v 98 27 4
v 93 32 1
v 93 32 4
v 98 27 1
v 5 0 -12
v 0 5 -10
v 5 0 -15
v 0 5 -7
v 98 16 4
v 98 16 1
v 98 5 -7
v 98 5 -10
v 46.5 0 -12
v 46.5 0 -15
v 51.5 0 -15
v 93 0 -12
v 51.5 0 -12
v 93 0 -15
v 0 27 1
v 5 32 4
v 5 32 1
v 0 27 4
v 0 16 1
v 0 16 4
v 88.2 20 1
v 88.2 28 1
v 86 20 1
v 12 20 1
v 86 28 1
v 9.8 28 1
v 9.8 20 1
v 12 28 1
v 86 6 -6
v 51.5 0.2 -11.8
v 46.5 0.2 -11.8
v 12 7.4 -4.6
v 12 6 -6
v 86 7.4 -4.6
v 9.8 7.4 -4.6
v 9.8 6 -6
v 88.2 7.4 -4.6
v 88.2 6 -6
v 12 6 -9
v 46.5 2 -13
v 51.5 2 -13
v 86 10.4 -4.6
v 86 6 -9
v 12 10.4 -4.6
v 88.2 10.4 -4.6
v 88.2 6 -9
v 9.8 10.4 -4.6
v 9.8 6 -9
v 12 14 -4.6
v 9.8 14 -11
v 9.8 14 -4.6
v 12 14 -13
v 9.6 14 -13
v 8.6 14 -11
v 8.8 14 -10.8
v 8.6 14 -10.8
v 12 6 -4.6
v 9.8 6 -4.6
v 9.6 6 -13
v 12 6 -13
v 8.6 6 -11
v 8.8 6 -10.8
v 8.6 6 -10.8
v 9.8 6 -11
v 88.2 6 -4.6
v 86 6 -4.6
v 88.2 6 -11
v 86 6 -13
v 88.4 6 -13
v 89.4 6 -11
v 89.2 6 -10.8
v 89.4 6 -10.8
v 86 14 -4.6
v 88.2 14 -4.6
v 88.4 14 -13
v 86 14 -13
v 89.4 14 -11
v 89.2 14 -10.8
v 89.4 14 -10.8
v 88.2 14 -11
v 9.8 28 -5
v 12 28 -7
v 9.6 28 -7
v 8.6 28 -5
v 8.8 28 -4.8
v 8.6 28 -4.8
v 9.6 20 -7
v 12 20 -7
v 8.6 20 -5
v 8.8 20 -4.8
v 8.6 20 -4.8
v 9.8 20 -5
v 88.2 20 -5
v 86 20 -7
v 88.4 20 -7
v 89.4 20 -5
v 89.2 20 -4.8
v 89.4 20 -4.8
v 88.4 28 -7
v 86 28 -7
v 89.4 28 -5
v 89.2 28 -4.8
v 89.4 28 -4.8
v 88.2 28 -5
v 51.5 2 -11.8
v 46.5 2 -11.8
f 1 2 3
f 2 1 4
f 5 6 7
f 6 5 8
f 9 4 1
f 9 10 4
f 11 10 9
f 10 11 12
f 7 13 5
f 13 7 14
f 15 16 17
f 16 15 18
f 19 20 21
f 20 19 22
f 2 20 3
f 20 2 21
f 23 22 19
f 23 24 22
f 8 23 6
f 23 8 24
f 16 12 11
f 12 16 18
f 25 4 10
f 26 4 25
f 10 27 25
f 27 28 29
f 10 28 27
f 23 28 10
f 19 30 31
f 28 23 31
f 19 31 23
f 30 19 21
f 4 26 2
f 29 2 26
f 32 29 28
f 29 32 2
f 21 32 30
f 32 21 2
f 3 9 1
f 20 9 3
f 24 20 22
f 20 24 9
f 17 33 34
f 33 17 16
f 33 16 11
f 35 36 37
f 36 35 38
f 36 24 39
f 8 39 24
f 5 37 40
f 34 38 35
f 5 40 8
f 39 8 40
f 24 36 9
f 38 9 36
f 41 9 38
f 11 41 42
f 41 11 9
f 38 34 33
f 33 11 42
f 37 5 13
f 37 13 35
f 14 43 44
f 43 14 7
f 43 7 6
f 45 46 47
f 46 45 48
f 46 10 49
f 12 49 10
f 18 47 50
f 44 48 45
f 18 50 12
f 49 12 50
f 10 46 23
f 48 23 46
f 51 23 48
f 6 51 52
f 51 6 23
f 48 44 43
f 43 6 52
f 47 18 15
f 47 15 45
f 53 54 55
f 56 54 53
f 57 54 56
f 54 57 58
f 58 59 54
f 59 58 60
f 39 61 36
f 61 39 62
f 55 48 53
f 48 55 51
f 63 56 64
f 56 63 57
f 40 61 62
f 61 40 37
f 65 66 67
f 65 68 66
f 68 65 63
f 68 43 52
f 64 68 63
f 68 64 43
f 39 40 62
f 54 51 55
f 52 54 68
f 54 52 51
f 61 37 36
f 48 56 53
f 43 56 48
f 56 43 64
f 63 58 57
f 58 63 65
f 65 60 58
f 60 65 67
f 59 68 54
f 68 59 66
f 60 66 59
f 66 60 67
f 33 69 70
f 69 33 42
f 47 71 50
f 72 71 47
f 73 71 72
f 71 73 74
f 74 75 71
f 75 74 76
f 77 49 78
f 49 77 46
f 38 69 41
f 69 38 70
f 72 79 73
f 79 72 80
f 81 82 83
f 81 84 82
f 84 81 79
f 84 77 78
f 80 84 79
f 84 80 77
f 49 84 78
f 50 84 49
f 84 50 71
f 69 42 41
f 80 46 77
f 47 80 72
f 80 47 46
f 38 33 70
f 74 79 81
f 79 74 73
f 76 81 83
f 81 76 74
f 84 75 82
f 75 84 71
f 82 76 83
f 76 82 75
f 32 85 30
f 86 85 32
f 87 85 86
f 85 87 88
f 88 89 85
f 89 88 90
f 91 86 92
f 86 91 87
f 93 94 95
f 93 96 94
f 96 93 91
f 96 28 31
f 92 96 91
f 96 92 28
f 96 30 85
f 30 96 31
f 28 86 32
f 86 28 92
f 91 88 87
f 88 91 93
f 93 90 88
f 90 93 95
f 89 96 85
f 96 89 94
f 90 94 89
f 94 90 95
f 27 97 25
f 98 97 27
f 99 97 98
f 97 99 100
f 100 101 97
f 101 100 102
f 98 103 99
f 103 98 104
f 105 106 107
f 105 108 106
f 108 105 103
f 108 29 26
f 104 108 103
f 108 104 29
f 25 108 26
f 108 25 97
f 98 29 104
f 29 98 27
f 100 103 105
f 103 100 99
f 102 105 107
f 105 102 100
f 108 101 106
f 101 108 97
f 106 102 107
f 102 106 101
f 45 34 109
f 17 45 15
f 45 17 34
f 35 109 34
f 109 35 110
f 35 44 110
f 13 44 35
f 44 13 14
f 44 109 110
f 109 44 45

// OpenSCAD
// file: lib/interface-contracts.scad
// Mechanical interface contracts shared by every part that mates to the case.
// Change interfaces here, never independently in a cover and its receiver.

case_body = [330, 155, 195];
case_wall = 4;
case_chamfer = 16;

front_contract_size = [155, 195, 12];
front_contract_screws = [[18, 18], [137, 18], [18, 177], [137, 177]];
front_button_opening = [45.2, 32.3];
front_button_origin = [15, 148];
front_usb_opening = [28.6, 71];
front_usb_origin = [111, 87];
front_usb_face = [27.93, 70.35, 3];

intake_contract_half = [130, 131, 4];
intake_contract_gap = 10;
intake_contract_origin_x = [30, 170];
intake_contract_z = 32;
intake_contract_magnet_local = [[24, 4], [106, 4],
                                [24, 127], [106, 127]];

esp_contract_opening = [74, 28];
esp_contract_cover = [98, 32, 3];
// Four side snaps: X axes coincide with the vertical opening edges, while the
// two Y levels stay clear of both the bottom chamfer and intake cover above.
esp_contract_snap_x = [12, 86];
esp_contract_snap_y = [10, 24];

rear_contract_screw_y = [30, 125];
rear_contract_screw_z = [5, 190];
rear_contract_horizontal_depth = 6;
rear_contract_vertical_depth = 44;

psu_contract_face = [110, 46.34];
psu_contract_rear_inner_x = 318;
// file: lib/snap-interface.scad
// Hidden panel snap interface v0.1.
// Print and test the coupon before committing full panels to a printer.

snap_arm_width = 8;
snap_arm_thickness = 2.2;
snap_arm_drop = 8;
snap_barb_depth = 1.0;
snap_barb_height = 2.0;
snap_slot_clearance = 0.30;

module snap_hook() {
    // Panel underside is Z=0; hook extends downward.
    union() {
        translate([-snap_arm_width / 2, 0, -snap_arm_drop])
            cube([snap_arm_width, snap_arm_thickness, snap_arm_drop + 0.4]);
        hull() {
            translate([-snap_arm_width / 2, snap_arm_thickness, -snap_arm_drop])
                cube([snap_arm_width, 0.2, snap_barb_height]);
            translate([-snap_arm_width / 2, snap_arm_thickness + snap_barb_depth, -snap_arm_drop + snap_barb_height])
                cube([snap_arm_width, 0.2, 0.2]);
        }
    }
}

module snap_receiver_slot(depth = 8, clearance = snap_slot_clearance) {
    translate([
        -snap_arm_width / 2 - clearance,
        -0.1,
        -snap_arm_drop - clearance
    ])
        cube([
            snap_arm_width + 2 * clearance,
            depth + 0.2,
            snap_arm_drop + 2 * clearance
        ]);
}
// main file
// Separate snap-fit cover for the side-load ESP32 relay cassette.
include <lib/snap-interface.scad>
include <lib/interface-contracts.scad>

$fn = 40;

// Local axes: X along the case, Y upward, Z toward the case exterior.
// The lower 16 mm follows the enclosure chamfer; above it the outer face is
// flush with the straight Y=155 side wall.
cover = esp_contract_cover;
cover_chamfer = 5;
snap_x = esp_contract_snap_x;
snap_y = esp_contract_snap_y;
flat_inner_z = 1;

// Inner surface follows the enclosure's lower 16 mm chamfer.  A snap anchored
// to the constant Z=1 plane at the lower edge would sit outside the case.
function inner_z_at(y, case_chamfer = 16) =
    y < case_chamfer ? flat_inner_z - case_chamfer + y : flat_inner_z;

module cover_outline_2d(cover_size = cover) {
    polygon([[cover_chamfer, 0], [cover_size[0] - cover_chamfer, 0],
             [cover_size[0], cover_chamfer],
             [cover_size[0], cover_size[1] - cover_chamfer],
             [cover_size[0] - cover_chamfer, cover_size[1]],
             [cover_chamfer, cover_size[1]], [0, cover_size[1] - cover_chamfer],
             [0, cover_chamfer]]);
}

module flush_chamfered_solid(cover_size = cover, case_chamfer = 16,
                             wall_thickness = 3) {
    intersection() {
        // Face outline and 5 mm corner cuts.
        translate([0, 0, -20])
            linear_extrude(height = 30) cover_outline_2d(cover_size);

        // Y/Z section: 3 mm material following the lower case chamfer, then
        // a constant Z=1..4 slab on the straight side wall.
        multmatrix([
            [0, 0, 1, 0],
            [1, 0, 0, 0],
            [0, 1, 0, 0],
            [0, 0, 0, 1]
        ])
            linear_extrude(height = cover_size[0])
                polygon([[0, 1 - case_chamfer], [case_chamfer, 1],
                         [cover_size[1], 1],
                         [cover_size[1], 1 + wall_thickness],
                         [case_chamfer, 1 + wall_thickness],
                         [0, 1 + wall_thickness - case_chamfer]]);
    }
}

module esp32_service_cover(cover_size = cover, case_chamfer = 16) {
    difference() {
        union() {
            flush_chamfered_solid(cover_size, case_chamfer, cover_size[2]);

            // Two hooks per side engage the vertical opening edges.  Side
            // retention avoids the intake cover immediately above this part.
            for (y = snap_y) {
                translate([snap_x[0], y, inner_z_at(y, case_chamfer)])
                    rotate([0, 0, 90]) snap_hook();
                translate([snap_x[1], y, inner_z_at(y, case_chamfer)])
                    rotate([0, 0, -90]) snap_hook();
            }
        }

        // Small 5 x 2 mm bottom chamfer/notch for a fingernail or plastic pick.
        translate([cover_size[0] / 2 - 2.5, -0.1,
                   0.9 - case_chamfer])
            cube([5, 2.1, 3.3]);
    }
}

esp32_service_cover();

echo("ESP32 service cover mm", cover);
echo("retention", "4 hidden cantilever snap hooks");
echo("bottom pry notch mm", [5, 2]);
echo("exterior openings", "none; solid outer face");
assert(cover[2] >= 3, "ESP32 cover is thinner than the structural minimum");
assert(snap_y[1] <= cover[1], "ESP32 snap axes exceed the cover");
assert(inner_z_at(snap_y[0], case_chamfer) < 0,
       "Lower ESP32 snaps do not follow the enclosure chamfer inward");
